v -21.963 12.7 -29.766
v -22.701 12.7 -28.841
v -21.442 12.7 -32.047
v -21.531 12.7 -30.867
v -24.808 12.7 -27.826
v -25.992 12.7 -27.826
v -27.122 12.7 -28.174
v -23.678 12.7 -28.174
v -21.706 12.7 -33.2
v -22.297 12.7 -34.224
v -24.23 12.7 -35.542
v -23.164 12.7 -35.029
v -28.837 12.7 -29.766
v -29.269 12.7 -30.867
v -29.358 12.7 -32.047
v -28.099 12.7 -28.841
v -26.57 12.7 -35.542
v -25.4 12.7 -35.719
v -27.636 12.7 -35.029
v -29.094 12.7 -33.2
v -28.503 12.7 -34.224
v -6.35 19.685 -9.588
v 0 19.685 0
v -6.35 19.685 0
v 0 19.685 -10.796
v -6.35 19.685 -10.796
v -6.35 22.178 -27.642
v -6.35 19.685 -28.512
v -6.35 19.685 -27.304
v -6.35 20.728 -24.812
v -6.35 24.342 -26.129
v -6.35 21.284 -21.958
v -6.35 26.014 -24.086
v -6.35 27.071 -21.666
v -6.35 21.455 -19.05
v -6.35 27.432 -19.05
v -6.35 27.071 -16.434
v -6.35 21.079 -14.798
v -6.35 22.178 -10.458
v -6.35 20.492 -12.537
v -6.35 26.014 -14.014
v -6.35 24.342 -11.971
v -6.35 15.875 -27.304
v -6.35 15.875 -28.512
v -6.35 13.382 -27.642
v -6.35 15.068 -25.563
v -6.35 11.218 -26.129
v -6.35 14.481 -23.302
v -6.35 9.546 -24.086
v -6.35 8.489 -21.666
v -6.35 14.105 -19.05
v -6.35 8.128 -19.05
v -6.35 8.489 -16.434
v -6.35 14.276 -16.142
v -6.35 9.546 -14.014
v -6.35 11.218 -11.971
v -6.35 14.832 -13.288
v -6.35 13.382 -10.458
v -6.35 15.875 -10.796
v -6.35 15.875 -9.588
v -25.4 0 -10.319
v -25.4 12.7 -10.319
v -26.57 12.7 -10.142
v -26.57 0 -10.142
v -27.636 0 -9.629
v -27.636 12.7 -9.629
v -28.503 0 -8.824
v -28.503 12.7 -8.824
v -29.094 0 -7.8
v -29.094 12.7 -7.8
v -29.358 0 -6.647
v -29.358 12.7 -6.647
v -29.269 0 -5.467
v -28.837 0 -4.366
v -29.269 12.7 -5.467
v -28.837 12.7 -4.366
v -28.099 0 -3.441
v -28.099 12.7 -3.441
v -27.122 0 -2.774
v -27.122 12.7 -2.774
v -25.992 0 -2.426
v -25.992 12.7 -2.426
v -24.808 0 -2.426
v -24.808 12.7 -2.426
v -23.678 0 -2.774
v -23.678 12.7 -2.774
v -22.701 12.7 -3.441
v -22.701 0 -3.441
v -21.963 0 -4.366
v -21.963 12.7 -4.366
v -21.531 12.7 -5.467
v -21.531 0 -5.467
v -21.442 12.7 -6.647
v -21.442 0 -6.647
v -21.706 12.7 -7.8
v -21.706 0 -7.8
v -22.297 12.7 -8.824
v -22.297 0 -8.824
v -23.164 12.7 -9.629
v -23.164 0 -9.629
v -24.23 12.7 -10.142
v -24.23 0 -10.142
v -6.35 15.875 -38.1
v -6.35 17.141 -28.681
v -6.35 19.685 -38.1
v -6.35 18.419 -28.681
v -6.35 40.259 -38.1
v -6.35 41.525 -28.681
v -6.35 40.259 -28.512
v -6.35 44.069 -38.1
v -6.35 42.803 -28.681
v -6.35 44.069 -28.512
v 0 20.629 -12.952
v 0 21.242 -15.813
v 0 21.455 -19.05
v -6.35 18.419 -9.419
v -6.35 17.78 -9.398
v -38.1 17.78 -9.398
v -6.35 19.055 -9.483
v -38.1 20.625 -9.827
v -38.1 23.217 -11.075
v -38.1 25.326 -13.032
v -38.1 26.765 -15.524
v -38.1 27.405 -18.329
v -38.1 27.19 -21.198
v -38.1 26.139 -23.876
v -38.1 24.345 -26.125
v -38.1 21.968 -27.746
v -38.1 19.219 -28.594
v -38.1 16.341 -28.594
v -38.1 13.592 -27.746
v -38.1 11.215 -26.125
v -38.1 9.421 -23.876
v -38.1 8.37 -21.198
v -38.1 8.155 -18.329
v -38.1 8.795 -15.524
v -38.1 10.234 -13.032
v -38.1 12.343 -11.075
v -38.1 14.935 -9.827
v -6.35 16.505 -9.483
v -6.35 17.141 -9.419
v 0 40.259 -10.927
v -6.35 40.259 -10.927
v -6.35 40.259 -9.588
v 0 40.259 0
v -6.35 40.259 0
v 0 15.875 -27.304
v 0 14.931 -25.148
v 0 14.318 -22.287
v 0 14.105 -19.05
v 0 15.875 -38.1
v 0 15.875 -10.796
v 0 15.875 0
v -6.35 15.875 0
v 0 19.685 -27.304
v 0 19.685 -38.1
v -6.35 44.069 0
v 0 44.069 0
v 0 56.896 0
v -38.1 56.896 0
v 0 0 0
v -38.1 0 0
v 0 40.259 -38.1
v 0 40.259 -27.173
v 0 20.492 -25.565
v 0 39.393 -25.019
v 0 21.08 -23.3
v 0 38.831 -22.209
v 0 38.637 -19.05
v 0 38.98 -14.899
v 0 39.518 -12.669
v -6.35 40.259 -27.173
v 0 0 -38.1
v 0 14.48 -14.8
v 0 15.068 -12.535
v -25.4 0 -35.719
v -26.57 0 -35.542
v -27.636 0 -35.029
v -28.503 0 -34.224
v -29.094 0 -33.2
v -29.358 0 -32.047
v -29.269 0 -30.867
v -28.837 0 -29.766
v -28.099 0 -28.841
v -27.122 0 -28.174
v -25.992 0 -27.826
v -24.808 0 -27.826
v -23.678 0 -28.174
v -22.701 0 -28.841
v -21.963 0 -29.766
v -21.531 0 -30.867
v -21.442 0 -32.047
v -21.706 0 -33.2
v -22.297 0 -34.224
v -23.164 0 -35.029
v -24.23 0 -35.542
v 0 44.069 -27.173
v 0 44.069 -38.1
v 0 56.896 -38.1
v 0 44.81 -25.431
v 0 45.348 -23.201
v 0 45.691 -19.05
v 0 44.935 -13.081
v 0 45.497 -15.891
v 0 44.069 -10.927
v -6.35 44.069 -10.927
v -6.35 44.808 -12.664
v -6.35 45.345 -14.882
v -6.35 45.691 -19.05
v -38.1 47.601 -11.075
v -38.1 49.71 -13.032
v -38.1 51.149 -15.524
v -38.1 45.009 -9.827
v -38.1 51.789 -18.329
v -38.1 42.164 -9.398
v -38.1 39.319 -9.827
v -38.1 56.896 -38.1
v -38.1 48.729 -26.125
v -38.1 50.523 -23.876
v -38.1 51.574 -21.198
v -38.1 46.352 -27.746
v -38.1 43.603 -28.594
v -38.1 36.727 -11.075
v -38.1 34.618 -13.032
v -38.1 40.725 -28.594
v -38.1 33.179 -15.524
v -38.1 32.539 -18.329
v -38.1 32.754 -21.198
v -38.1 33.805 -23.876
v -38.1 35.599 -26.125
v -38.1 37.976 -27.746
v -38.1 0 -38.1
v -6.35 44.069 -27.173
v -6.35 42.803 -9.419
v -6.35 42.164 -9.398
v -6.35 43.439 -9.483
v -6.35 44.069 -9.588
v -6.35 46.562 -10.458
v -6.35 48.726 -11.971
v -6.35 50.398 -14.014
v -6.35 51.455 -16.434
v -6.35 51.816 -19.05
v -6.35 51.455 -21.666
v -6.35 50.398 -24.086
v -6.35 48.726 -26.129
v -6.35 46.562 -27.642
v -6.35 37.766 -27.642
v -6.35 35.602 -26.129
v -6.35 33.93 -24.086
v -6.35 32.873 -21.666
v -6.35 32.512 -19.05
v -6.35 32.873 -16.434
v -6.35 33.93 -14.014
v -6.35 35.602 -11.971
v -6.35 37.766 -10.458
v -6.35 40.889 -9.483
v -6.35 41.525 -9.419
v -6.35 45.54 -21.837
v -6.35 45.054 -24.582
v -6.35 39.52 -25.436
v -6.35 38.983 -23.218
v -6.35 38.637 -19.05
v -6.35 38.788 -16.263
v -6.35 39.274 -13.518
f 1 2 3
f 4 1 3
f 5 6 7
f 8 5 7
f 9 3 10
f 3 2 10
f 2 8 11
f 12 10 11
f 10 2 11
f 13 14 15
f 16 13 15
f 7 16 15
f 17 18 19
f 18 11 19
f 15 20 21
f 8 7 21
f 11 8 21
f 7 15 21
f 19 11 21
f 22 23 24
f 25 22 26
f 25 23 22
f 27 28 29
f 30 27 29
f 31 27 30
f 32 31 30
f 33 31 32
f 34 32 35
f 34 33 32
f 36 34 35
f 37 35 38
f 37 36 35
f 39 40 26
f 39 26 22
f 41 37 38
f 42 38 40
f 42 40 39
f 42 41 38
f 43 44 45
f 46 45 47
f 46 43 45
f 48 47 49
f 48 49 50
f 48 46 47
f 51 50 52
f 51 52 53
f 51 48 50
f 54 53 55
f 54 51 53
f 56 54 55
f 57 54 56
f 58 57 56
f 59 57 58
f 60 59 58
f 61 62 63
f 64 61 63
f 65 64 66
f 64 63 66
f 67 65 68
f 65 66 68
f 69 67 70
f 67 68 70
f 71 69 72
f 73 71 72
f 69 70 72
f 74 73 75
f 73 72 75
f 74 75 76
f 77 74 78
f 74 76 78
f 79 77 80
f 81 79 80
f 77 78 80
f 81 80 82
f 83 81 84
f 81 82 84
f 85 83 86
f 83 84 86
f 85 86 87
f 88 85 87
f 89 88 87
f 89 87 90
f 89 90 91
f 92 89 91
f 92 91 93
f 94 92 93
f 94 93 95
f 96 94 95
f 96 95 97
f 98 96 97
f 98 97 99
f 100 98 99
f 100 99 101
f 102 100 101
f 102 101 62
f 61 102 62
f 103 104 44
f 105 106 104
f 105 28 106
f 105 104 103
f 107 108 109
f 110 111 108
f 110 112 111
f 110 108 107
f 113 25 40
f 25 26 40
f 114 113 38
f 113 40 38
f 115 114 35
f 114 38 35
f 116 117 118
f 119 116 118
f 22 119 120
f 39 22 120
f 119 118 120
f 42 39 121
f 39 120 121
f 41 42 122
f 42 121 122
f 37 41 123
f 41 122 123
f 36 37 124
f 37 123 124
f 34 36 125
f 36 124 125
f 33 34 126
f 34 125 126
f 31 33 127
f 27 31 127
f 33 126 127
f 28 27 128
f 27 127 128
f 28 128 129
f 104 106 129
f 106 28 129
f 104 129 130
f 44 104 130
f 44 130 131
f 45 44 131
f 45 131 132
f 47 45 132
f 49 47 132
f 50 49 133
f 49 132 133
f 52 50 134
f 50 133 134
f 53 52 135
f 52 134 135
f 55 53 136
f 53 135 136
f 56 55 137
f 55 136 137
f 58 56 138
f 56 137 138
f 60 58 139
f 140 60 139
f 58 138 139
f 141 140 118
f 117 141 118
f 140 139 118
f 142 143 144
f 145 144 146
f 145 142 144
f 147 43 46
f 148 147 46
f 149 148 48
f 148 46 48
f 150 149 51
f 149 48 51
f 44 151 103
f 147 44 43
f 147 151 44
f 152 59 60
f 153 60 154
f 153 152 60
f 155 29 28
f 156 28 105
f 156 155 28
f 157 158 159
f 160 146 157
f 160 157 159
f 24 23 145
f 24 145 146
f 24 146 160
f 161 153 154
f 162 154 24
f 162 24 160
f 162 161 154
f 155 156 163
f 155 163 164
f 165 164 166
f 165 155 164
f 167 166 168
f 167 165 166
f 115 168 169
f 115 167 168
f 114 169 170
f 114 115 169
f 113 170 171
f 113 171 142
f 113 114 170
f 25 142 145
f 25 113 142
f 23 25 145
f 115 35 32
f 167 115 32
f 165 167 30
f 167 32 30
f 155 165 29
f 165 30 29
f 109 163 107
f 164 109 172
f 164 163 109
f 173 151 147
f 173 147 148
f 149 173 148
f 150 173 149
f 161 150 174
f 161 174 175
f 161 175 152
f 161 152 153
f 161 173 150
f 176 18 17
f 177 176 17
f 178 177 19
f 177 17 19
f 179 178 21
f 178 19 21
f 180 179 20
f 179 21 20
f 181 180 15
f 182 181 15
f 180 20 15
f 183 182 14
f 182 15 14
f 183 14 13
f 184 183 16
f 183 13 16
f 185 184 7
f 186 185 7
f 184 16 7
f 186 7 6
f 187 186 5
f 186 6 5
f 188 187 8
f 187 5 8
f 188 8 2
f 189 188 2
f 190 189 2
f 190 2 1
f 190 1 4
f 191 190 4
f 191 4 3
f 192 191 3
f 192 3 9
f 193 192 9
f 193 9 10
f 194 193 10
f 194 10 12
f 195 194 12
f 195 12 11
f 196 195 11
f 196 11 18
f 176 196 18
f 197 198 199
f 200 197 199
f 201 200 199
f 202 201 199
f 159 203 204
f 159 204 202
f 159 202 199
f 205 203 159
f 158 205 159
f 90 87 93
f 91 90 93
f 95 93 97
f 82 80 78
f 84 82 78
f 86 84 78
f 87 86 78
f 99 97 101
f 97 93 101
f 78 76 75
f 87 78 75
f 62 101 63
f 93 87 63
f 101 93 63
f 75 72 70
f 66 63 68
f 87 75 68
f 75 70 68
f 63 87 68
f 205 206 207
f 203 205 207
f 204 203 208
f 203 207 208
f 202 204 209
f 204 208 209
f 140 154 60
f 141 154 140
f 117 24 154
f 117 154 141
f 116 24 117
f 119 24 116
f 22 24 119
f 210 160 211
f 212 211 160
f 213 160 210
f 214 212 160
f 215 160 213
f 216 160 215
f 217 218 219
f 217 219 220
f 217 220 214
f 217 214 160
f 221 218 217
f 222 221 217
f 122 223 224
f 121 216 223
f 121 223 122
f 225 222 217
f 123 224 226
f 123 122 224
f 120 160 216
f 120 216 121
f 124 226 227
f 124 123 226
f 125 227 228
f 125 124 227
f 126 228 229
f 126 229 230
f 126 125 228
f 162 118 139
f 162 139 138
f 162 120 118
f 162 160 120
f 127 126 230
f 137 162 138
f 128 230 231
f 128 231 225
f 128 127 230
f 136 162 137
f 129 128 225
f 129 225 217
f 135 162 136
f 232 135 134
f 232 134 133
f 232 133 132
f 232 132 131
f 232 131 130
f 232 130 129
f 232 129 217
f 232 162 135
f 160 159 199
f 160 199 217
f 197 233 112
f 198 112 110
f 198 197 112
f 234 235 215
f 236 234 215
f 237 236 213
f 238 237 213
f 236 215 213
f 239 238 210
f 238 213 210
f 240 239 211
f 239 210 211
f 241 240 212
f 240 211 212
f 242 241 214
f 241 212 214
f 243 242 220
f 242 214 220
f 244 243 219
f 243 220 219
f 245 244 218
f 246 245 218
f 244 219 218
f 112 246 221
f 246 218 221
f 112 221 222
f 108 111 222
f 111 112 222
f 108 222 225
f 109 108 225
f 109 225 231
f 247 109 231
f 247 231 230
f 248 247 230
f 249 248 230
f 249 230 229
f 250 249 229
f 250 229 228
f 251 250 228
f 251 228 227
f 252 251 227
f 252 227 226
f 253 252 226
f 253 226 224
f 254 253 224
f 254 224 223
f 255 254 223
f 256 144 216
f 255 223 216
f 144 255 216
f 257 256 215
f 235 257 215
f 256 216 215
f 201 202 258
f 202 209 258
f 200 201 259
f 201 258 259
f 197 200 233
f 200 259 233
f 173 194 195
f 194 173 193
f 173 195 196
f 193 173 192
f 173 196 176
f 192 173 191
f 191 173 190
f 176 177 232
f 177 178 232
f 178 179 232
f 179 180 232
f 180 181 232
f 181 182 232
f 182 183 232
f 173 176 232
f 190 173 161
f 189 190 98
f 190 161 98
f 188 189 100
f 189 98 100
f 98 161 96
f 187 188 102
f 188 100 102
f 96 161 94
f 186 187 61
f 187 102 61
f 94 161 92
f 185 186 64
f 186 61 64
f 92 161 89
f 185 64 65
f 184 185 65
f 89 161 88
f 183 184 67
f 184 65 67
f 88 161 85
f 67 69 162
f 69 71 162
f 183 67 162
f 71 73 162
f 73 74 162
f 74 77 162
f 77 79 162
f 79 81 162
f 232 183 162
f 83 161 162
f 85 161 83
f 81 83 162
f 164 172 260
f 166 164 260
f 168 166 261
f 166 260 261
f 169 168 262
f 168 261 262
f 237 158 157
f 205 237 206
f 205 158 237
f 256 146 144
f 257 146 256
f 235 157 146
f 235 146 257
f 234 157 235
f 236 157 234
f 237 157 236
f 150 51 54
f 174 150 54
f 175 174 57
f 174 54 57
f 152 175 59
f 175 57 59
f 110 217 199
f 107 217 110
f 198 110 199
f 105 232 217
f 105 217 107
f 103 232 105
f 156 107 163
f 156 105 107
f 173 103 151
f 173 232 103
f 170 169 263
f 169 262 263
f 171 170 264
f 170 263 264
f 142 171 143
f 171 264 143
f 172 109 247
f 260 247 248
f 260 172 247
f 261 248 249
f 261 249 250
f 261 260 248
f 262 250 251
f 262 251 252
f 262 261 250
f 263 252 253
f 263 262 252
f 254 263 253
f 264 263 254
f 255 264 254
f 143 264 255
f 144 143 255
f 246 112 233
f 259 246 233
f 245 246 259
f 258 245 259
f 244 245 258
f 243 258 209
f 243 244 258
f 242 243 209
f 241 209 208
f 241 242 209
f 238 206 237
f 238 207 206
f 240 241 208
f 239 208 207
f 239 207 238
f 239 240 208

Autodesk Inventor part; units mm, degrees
ref_plane "YZ Plane" through (0, 0, 0) normal (1, 0, 0) x (0, 1, 0)
ref_plane "XZ Plane" through (0, 0, 0) normal (0, 1, 0) x (-1, 0, 0)
ref_plane "XY Plane" through (0, 0, 0) normal (0, 0, 1) x (1, 0, 0)
sketch "Sketch1" plane through (0, 0, 0) normal (0, 1, 0) x (-1, 0, 0)
  line L0 (0, 0) -> (38.1, 0)
  line L1 (38.1, 0) -> (38.1, -38.1)
  line L2 (38.1, -38.1) -> (0, -38.1)
  line L3 (0, -38.1) -> (0, 0)
  line L4 (0, -38.1) -> (0, -31.75)
  line L5 (0, -38.1) -> (6.35, -38.1) construction
  line L6 (0, -31.75) -> (25.4, -31.75)
  line L7 (25.4, -31.75) -> (25.4, -6.35)
  dimension "d0" = 38.1
  dimension "d1" = 38.1
  dimension "d2" = 6.35
  dimension "d3" = 90
  dimension "d4" = 25.4
  dimension "d5" = 90
  dimension "d6" = 25.4
extrude "Extrusion1" add sketch "Sketch1" along normal blind 56.896
hole "Hole1" at (-25.4, 0, -31.75) at (-25.4, 0, -6.35) direction (0, 1, 0) diameter 7.9375 depth 12.7
sketch "Sketch2" plane through (-38.1, 0, -38.1) normal (-1, 0, 0) x (0, 0, 1)
  line L0 (38.1, 0) -> (0, 0) projected
  line L1 (19.05, 0) -> (19.05, 17.78)
  line L2 (19.05, 0) -> (36.83, 0) construction
  line L3 (19.05, 17.78) -> (19.05, 27.432)
  line L4 (19.05, 17.78) -> (28.702, 17.78) construction
  line L5 (19.05, 27.432) -> (19.05, 32.512)
  line L6 (19.05, 32.512) -> (19.05, 42.164)
  circle A0 centre (19.05, 17.78) radius 9.652
  circle A1 centre (19.05, 42.164) radius 9.652
  ellipse E0 centre (19.05, 42.164) end of major axis (28.702, 42.164) minor radius 3.5267
  ellipse E1 centre (19.05, 17.78) end of major axis (28.702, 17.78) minor radius 3.6751
  line L7 (19.05, 42.164) -> (19.05, 56.896)
  dimension "d16" = 17.78
  dimension "d17" = 90
  dimension "d18" = 9.652
  dimension "d19" = 90
  dimension "d20" = 5.08
  dimension "d21" = 180
  dimension "d22" = 9.652
  dimension "d23" = 180
  dimension "d32" = 14.732
extrude "Extrusion2" cut sketch "Sketch2" against normal blind 31.75
extrude "Extrusion3" cut sketch "Sketch2" against normal blind 38.1 contours E1 L3 L1 | L1 L3 E1 | E0 L7 L6 | L6 L7 E0
sketch "Sketch3" plane through (0, 0, 0) normal (1, 0, 0) x (0, 0, -1)
  line L0 (38.1, 0) -> (38.1, 56.896) projected
  line L1 (0, 44.069) -> (38.1, 44.069)
  line L2 (38.1, 44.069) -> (38.1, 40.259)
  line L3 (38.1, 40.259) -> (0, 40.259)
  line L4 (0, 40.259) -> (0, 44.069)
  line L5 (0, 44.069) -> (38.1, 40.259) construction
  line L6 (38.1, 44.069) -> (0, 40.259) construction
  line L7 (0, 19.685) -> (38.1, 19.685)
  line L8 (38.1, 19.685) -> (38.1, 15.875)
  line L9 (38.1, 15.875) -> (0, 15.875)
  line L10 (0, 15.875) -> (0, 19.685)
  line L11 (0, 19.685) -> (38.1, 15.875) construction
  line L12 (38.1, 19.685) -> (0, 15.875) construction
  point P0 (0, 0)
  point P1 (19.05, 17.78)
  point P2 (19.05, 42.164)
  dimension "d28" = 3.81
  dimension "d29" = 3.81
extrude "Extrusion4" cut sketch "Sketch3" against normal blind 6.35
properties part number "Valve Holder"
